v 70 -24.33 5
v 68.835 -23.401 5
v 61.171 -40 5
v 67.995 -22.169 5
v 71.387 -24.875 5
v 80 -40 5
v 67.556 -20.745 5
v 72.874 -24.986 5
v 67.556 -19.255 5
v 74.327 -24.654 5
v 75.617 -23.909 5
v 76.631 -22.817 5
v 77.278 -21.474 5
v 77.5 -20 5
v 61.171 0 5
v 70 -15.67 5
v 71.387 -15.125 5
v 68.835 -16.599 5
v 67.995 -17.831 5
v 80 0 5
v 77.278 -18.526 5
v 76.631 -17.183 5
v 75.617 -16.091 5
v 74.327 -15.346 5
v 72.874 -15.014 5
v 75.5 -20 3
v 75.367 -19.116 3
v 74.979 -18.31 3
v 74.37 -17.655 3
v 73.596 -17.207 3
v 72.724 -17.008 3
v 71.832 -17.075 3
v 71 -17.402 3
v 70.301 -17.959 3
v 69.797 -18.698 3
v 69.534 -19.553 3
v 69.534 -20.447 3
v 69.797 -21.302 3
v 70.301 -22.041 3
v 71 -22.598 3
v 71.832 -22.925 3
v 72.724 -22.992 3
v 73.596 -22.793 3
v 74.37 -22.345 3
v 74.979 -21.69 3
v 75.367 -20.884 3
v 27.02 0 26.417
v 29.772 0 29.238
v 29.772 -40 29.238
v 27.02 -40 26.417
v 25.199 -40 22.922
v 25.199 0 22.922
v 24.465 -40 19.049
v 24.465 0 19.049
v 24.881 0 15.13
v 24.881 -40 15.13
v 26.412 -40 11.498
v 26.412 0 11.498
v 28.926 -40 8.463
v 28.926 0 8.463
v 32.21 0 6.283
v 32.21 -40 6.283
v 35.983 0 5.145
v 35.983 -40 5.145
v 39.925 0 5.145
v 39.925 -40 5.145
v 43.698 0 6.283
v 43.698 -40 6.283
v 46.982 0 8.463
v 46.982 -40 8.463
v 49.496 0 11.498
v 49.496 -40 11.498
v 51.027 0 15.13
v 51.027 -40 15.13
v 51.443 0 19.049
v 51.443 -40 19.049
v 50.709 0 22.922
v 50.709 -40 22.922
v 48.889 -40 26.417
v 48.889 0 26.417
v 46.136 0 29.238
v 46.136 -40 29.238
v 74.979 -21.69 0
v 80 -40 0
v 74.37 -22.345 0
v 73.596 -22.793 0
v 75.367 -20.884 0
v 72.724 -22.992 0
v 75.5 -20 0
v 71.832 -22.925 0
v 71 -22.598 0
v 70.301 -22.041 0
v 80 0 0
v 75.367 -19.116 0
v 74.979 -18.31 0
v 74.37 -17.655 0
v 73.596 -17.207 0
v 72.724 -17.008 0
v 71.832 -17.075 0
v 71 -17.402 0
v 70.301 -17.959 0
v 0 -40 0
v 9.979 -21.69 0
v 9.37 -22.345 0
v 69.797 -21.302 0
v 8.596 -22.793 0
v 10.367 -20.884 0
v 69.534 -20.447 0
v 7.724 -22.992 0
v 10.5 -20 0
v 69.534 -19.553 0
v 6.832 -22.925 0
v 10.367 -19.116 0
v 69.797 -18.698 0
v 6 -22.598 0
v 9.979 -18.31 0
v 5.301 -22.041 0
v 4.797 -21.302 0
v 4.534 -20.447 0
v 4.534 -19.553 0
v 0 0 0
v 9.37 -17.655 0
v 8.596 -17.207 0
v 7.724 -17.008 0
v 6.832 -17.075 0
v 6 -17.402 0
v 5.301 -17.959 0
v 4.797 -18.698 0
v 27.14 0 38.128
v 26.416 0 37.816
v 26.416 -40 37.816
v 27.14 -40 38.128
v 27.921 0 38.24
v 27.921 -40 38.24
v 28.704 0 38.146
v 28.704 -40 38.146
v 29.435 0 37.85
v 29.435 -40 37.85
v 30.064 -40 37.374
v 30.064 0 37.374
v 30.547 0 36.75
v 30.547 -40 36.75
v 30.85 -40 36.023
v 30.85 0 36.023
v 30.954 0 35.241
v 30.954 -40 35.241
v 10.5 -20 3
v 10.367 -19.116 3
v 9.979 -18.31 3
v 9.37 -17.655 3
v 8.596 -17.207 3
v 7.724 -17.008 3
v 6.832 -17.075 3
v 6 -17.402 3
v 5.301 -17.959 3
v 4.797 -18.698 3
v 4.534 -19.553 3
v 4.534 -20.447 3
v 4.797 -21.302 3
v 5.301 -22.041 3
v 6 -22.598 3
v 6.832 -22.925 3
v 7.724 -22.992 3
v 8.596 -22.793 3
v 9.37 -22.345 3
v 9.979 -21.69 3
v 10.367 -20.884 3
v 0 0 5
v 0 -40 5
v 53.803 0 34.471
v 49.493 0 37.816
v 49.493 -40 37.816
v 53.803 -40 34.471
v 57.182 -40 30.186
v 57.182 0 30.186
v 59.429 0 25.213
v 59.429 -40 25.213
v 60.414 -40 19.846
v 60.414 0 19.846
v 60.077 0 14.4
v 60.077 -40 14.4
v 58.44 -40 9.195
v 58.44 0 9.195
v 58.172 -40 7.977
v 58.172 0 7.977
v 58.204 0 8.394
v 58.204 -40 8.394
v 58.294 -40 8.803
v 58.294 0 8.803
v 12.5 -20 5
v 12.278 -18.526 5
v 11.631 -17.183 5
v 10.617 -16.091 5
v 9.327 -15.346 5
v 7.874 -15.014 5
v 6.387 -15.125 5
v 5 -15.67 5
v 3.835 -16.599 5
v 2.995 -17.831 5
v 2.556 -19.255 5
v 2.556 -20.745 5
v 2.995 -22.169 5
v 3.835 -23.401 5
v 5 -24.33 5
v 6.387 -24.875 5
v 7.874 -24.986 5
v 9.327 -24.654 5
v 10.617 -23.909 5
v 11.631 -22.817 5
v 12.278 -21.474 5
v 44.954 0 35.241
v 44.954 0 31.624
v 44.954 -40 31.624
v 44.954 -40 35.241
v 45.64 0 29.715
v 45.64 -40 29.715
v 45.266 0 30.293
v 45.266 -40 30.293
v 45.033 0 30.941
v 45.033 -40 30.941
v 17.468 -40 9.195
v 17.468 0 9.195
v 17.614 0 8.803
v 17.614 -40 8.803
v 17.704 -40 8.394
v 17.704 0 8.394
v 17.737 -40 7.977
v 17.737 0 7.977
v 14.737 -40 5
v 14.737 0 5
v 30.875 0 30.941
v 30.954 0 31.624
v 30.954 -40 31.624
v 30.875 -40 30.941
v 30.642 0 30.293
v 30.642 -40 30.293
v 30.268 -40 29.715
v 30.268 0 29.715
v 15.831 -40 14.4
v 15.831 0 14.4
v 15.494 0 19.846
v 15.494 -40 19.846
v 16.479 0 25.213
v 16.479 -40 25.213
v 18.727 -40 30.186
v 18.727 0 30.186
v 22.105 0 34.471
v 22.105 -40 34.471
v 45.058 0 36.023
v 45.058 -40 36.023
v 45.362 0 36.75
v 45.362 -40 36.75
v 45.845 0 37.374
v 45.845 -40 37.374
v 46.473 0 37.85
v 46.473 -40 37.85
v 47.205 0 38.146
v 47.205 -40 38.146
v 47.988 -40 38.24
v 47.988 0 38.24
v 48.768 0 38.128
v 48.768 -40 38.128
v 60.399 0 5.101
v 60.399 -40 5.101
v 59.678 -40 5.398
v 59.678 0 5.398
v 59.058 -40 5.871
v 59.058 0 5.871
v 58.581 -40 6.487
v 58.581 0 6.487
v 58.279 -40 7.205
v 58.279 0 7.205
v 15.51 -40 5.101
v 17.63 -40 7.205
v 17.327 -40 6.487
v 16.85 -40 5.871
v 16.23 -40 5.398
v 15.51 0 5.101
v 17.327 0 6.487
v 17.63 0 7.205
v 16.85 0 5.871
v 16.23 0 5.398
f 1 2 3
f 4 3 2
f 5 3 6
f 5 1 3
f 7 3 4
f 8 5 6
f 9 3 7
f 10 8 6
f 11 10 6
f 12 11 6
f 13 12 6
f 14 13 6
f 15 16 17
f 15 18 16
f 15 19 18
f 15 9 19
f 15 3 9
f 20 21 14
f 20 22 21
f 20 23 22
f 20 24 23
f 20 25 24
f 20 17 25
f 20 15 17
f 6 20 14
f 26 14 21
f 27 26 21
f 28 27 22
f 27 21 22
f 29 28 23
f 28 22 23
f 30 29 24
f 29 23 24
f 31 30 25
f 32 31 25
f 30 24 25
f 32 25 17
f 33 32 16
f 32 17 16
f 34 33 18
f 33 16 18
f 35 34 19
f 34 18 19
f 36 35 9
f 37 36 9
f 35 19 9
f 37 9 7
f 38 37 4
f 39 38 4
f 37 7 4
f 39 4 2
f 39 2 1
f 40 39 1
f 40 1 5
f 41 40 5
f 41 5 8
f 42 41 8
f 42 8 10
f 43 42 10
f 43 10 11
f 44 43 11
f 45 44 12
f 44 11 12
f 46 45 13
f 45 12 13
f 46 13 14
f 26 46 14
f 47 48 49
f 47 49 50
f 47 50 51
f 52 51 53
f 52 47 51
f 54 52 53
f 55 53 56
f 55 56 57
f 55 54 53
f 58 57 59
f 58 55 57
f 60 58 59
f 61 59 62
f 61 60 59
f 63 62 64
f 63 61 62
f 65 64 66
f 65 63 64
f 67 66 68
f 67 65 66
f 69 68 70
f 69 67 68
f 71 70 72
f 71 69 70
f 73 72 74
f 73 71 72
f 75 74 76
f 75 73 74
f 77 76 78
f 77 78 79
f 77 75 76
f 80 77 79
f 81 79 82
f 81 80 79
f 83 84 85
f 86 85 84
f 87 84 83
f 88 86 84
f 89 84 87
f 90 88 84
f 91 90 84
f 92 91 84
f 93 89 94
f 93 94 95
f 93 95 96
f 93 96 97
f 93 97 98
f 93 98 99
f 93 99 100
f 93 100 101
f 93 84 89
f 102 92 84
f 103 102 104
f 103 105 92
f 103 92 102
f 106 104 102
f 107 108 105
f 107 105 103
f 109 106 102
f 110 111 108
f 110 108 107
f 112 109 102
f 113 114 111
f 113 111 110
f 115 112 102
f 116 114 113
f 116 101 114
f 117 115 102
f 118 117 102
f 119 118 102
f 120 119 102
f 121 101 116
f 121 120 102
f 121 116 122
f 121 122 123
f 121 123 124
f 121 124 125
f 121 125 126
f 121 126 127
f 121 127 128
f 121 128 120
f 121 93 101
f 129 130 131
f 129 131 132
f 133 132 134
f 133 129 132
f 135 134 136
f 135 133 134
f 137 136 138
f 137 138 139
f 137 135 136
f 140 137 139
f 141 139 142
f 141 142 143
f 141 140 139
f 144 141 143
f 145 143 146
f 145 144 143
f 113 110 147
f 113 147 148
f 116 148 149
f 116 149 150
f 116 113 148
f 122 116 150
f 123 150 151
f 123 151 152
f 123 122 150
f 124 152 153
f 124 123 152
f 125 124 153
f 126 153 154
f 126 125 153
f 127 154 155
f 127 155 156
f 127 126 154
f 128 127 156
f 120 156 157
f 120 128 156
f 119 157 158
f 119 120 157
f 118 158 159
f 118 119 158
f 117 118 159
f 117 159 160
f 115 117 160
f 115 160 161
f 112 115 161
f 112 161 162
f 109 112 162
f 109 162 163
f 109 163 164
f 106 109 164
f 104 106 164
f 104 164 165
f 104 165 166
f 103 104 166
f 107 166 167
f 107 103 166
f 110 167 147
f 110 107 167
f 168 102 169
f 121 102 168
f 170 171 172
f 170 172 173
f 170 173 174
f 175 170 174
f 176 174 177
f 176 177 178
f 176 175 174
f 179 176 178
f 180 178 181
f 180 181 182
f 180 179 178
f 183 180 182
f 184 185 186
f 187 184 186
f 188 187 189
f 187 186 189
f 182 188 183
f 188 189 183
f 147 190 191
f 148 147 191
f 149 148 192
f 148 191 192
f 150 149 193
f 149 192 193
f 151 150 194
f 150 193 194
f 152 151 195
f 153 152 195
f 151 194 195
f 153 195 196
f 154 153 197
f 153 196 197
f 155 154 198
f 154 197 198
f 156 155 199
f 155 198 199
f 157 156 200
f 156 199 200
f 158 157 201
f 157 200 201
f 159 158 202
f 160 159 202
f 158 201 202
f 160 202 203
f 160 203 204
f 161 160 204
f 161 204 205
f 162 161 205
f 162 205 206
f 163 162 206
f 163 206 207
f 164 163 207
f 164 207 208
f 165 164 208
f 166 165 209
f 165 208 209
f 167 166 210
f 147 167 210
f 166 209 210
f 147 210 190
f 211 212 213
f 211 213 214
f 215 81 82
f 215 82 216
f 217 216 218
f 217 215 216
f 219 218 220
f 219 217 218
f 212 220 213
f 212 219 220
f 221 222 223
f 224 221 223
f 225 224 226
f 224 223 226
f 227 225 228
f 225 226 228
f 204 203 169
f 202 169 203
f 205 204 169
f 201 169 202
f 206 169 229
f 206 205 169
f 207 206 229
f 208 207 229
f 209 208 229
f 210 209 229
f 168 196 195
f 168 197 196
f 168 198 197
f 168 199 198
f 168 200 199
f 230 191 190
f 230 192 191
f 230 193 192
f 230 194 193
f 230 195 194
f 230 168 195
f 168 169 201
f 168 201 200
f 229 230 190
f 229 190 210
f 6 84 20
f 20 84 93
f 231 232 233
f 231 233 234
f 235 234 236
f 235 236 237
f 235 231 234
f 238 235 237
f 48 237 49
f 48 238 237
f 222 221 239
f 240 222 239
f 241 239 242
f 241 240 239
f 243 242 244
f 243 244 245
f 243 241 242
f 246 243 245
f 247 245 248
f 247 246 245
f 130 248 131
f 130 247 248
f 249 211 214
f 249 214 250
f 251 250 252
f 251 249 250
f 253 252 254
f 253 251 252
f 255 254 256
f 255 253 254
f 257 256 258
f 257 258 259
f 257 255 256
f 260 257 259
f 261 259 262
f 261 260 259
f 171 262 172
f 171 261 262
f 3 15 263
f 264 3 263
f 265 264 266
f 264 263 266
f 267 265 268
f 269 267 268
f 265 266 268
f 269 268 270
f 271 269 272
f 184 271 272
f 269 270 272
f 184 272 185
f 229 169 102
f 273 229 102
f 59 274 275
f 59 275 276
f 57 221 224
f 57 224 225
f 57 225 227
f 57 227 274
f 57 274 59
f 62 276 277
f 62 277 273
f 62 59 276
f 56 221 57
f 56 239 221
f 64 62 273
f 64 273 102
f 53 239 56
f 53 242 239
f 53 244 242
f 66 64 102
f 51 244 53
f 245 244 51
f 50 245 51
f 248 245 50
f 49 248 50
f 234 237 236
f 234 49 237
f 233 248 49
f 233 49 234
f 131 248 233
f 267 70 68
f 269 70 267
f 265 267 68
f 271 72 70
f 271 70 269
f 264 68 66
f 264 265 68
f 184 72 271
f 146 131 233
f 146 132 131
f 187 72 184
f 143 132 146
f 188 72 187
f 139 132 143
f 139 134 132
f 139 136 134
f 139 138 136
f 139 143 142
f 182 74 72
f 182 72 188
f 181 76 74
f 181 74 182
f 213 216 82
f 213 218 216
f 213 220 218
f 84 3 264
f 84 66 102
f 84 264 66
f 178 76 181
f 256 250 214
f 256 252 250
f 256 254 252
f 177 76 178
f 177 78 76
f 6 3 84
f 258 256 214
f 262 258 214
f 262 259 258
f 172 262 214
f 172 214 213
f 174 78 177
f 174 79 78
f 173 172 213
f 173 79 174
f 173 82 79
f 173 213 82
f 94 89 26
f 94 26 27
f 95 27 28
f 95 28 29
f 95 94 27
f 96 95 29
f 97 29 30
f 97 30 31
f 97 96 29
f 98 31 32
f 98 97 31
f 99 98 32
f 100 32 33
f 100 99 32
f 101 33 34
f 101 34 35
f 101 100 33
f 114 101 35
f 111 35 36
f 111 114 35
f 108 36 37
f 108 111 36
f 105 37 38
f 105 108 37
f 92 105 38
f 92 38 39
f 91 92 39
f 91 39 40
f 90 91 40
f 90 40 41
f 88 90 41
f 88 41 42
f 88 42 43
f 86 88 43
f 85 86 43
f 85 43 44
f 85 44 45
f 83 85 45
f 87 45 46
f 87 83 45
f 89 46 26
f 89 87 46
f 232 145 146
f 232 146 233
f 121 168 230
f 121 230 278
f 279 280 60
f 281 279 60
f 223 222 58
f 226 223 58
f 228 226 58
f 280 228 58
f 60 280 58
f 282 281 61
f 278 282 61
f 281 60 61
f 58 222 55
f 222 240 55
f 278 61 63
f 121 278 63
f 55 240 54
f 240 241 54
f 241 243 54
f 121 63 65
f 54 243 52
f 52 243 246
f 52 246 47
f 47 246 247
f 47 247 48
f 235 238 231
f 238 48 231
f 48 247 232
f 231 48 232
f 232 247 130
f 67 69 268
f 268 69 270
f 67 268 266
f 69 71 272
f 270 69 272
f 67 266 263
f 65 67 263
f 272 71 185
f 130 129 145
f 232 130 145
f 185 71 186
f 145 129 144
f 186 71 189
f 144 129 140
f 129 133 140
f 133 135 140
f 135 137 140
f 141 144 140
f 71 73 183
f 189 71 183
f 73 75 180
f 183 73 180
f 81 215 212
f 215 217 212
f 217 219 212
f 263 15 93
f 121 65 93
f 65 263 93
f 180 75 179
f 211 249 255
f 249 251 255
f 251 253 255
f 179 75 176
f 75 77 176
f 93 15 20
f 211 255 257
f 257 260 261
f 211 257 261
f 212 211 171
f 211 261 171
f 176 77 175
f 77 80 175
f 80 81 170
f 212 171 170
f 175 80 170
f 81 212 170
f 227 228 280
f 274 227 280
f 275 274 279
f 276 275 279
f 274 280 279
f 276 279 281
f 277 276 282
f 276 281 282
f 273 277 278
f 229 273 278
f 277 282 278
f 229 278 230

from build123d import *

# Parameters (mm, degrees)
F0_W        = 80
F0_H        = 40
F0_R        = 3
F0_W_2      = 50
F0_H_2      = 30
F1_DEPTH    = 5
F2_SIZE     = 2
F6_DEPTH    = 40
F7_T1_DEPTH = 40
F7_T3_DEPTH = 64.9354908843
F7_T5_DEPTH = 47.905041839


# Not quite as in the source:
# - a fillet or chamfer that OpenCascade refuses, or shapes differently, is made with other operations: its cross-section is extruded or revolved along the edge and cut away or added


with BuildPart() as f1:
    # F0 (on Top) → F1 (new body)
    with BuildSketch(Plane.XY):
        with Locations((40, -20)):
            Rectangle(F0_W, F0_H)
        with Locations((7.5, -20)):
            Circle(F0_R, mode=Mode.SUBTRACT)
        with Locations((40, -20)):
            Rectangle(F0_W_2, F0_H_2, mode=Mode.SUBTRACT)
        with Locations((72.5, -20)):
            Circle(F0_R, mode=Mode.SUBTRACT)
        with Locations((40, -20)):
            Rectangle(F0_W_2, F0_H_2)
    extrude(amount=F1_DEPTH)

    # F2
    f2_edges = [f1.edges().sort_by_distance(p)[0] for p in [
        (4.5, -20, 5),
        (69.5, -20, 5),
    ]]
    chamfer(f2_edges, length=F2_SIZE)

    # F5 (on plane+point) → F6 (join)
    with BuildSketch(Plane(origin=(0, 0, 0), x_dir=(-1, 0, 0), z_dir=(0, 1, 0))):
        with BuildLine():
            ThreePointArc((-30.954095751, 30.0433963806), (-37.954095751, 5), (-44.954095751, 30.0433963806))
            Line((-44.954095751, 30.0433963806), (-44.954095751, 39.8834047803))
            ThreePointArc((-44.954095751, 39.8834047803), (-58.6775836128, 27.2628220822), (-58.1714250849, 8.625305341))
            Line((-58.1714250849, 8.625305341), (-58.1714250849, 0))
            Line((-58.1714250849, 0), (-17.7367664172, 0))
            Line((-17.7367664172, 0), (-17.7367664172, 8.625305341))
            ThreePointArc((-17.7367664172, 8.625305341), (-17.2306078893, 27.2628220822), (-30.954095751, 39.8834047803))
            Line((-30.954095751, 39.8834047803), (-30.954095751, 30.0433963806))
        make_face()
    extrude(amount=-F6_DEPTH)

    # F7: fillet of radius 3 on 8 edges, made by hand

    # F7_s2 → F7_t1 (join)
    with BuildSketch(Plane.XZ):
        with BuildLine():
            ThreePointArc((58.1714250849, 7.9545925349), (58.2393309928, 8.5892768936), (58.439974575, 9.1952287073))
            ThreePointArc((58.439974575, 9.1952287073), (58.3076947386, 8.9093270176), (58.1714250849, 8.625305341))
            Line((58.1714250849, 8.625305341), (58.1714250849, 7.9545925349))
        make_face()
        with BuildLine():
            ThreePointArc((61.1714250849, 5), (59.0501047413, 5.8786796564), (58.1714250849, 8))
            Line((58.1714250849, 8), (58.1714250849, 5))
            Line((58.1714250849, 5), (61.1714250849, 5))
        make_face()
        with BuildLine():
            ThreePointArc((17.4682169271, 9.1952287073), (17.6688605093, 8.5892768936), (17.7367664172, 7.9545925349))
            Line((17.7367664172, 7.9545925349), (17.7367664172, 8.625305341))
            ThreePointArc((17.7367664172, 8.625305341), (17.6004967635, 8.9093270176), (17.4682169271, 9.1952287073))
        make_face()
        with BuildLine():
            ThreePointArc((17.7367664172, 8), (16.8580867608, 5.8786796564), (14.7367664172, 5))
            Line((14.7367664172, 5), (17.7367664172, 5))
            Line((17.7367664172, 5), (17.7367664172, 8))
        make_face()
    extrude(amount=F7_T1_DEPTH)

    # F7_s4 → F7_t3 (cut)
    with BuildSketch(Plane.XZ.offset(-12.4677454421)):
        with BuildLine():
            ThreePointArc((44.954095751, 35.2406690428), (46.4734514007, 37.8498245207), (49.4925572895, 37.8161565878))
            ThreePointArc((49.4925572895, 37.8161565878), (47.2807788606, 38.9759122428), (44.954095751, 39.8834047803))
            Line((44.954095751, 39.8834047803), (44.954095751, 35.2406690428))
        make_face()
        with BuildLine():
            ThreePointArc((26.4156342126, 37.8161565878), (29.4347401014, 37.8498245207), (30.954095751, 35.2406690428))
            Line((30.954095751, 35.2406690428), (30.954095751, 39.8834047803))
            ThreePointArc((30.954095751, 39.8834047803), (28.6274126415, 38.9759122428), (26.4156342126, 37.8161565878))
        make_face()
    extrude(amount=F7_T3_DEPTH, mode=Mode.SUBTRACT)

    # F7_s6 → F7_t5 (cut)
    with BuildSketch(Plane.XZ.offset(-3.9525209195)):
        with BuildLine():
            ThreePointArc((46.1359139329, 29.2381493396), (45.2657370088, 30.2929667015), (44.954095751, 31.6244047484))
            Line((44.954095751, 31.6244047484), (44.954095751, 30.0433963806))
            ThreePointArc((44.954095751, 30.0433963806), (45.5556749637, 29.6564328293), (46.1359139329, 29.2381493396))
        make_face()
        with BuildLine():
            ThreePointArc((30.954095751, 31.6244047484), (30.6424544933, 30.2929667015), (29.7722775692, 29.2381493396))
            ThreePointArc((29.7722775692, 29.2381493396), (30.3525165384, 29.6564328293), (30.954095751, 30.0433963806))
            Line((30.954095751, 30.0433963806), (30.954095751, 31.6244047484))
        make_face()
    extrude(amount=F7_T5_DEPTH, mode=Mode.SUBTRACT)


solid = f1.part
